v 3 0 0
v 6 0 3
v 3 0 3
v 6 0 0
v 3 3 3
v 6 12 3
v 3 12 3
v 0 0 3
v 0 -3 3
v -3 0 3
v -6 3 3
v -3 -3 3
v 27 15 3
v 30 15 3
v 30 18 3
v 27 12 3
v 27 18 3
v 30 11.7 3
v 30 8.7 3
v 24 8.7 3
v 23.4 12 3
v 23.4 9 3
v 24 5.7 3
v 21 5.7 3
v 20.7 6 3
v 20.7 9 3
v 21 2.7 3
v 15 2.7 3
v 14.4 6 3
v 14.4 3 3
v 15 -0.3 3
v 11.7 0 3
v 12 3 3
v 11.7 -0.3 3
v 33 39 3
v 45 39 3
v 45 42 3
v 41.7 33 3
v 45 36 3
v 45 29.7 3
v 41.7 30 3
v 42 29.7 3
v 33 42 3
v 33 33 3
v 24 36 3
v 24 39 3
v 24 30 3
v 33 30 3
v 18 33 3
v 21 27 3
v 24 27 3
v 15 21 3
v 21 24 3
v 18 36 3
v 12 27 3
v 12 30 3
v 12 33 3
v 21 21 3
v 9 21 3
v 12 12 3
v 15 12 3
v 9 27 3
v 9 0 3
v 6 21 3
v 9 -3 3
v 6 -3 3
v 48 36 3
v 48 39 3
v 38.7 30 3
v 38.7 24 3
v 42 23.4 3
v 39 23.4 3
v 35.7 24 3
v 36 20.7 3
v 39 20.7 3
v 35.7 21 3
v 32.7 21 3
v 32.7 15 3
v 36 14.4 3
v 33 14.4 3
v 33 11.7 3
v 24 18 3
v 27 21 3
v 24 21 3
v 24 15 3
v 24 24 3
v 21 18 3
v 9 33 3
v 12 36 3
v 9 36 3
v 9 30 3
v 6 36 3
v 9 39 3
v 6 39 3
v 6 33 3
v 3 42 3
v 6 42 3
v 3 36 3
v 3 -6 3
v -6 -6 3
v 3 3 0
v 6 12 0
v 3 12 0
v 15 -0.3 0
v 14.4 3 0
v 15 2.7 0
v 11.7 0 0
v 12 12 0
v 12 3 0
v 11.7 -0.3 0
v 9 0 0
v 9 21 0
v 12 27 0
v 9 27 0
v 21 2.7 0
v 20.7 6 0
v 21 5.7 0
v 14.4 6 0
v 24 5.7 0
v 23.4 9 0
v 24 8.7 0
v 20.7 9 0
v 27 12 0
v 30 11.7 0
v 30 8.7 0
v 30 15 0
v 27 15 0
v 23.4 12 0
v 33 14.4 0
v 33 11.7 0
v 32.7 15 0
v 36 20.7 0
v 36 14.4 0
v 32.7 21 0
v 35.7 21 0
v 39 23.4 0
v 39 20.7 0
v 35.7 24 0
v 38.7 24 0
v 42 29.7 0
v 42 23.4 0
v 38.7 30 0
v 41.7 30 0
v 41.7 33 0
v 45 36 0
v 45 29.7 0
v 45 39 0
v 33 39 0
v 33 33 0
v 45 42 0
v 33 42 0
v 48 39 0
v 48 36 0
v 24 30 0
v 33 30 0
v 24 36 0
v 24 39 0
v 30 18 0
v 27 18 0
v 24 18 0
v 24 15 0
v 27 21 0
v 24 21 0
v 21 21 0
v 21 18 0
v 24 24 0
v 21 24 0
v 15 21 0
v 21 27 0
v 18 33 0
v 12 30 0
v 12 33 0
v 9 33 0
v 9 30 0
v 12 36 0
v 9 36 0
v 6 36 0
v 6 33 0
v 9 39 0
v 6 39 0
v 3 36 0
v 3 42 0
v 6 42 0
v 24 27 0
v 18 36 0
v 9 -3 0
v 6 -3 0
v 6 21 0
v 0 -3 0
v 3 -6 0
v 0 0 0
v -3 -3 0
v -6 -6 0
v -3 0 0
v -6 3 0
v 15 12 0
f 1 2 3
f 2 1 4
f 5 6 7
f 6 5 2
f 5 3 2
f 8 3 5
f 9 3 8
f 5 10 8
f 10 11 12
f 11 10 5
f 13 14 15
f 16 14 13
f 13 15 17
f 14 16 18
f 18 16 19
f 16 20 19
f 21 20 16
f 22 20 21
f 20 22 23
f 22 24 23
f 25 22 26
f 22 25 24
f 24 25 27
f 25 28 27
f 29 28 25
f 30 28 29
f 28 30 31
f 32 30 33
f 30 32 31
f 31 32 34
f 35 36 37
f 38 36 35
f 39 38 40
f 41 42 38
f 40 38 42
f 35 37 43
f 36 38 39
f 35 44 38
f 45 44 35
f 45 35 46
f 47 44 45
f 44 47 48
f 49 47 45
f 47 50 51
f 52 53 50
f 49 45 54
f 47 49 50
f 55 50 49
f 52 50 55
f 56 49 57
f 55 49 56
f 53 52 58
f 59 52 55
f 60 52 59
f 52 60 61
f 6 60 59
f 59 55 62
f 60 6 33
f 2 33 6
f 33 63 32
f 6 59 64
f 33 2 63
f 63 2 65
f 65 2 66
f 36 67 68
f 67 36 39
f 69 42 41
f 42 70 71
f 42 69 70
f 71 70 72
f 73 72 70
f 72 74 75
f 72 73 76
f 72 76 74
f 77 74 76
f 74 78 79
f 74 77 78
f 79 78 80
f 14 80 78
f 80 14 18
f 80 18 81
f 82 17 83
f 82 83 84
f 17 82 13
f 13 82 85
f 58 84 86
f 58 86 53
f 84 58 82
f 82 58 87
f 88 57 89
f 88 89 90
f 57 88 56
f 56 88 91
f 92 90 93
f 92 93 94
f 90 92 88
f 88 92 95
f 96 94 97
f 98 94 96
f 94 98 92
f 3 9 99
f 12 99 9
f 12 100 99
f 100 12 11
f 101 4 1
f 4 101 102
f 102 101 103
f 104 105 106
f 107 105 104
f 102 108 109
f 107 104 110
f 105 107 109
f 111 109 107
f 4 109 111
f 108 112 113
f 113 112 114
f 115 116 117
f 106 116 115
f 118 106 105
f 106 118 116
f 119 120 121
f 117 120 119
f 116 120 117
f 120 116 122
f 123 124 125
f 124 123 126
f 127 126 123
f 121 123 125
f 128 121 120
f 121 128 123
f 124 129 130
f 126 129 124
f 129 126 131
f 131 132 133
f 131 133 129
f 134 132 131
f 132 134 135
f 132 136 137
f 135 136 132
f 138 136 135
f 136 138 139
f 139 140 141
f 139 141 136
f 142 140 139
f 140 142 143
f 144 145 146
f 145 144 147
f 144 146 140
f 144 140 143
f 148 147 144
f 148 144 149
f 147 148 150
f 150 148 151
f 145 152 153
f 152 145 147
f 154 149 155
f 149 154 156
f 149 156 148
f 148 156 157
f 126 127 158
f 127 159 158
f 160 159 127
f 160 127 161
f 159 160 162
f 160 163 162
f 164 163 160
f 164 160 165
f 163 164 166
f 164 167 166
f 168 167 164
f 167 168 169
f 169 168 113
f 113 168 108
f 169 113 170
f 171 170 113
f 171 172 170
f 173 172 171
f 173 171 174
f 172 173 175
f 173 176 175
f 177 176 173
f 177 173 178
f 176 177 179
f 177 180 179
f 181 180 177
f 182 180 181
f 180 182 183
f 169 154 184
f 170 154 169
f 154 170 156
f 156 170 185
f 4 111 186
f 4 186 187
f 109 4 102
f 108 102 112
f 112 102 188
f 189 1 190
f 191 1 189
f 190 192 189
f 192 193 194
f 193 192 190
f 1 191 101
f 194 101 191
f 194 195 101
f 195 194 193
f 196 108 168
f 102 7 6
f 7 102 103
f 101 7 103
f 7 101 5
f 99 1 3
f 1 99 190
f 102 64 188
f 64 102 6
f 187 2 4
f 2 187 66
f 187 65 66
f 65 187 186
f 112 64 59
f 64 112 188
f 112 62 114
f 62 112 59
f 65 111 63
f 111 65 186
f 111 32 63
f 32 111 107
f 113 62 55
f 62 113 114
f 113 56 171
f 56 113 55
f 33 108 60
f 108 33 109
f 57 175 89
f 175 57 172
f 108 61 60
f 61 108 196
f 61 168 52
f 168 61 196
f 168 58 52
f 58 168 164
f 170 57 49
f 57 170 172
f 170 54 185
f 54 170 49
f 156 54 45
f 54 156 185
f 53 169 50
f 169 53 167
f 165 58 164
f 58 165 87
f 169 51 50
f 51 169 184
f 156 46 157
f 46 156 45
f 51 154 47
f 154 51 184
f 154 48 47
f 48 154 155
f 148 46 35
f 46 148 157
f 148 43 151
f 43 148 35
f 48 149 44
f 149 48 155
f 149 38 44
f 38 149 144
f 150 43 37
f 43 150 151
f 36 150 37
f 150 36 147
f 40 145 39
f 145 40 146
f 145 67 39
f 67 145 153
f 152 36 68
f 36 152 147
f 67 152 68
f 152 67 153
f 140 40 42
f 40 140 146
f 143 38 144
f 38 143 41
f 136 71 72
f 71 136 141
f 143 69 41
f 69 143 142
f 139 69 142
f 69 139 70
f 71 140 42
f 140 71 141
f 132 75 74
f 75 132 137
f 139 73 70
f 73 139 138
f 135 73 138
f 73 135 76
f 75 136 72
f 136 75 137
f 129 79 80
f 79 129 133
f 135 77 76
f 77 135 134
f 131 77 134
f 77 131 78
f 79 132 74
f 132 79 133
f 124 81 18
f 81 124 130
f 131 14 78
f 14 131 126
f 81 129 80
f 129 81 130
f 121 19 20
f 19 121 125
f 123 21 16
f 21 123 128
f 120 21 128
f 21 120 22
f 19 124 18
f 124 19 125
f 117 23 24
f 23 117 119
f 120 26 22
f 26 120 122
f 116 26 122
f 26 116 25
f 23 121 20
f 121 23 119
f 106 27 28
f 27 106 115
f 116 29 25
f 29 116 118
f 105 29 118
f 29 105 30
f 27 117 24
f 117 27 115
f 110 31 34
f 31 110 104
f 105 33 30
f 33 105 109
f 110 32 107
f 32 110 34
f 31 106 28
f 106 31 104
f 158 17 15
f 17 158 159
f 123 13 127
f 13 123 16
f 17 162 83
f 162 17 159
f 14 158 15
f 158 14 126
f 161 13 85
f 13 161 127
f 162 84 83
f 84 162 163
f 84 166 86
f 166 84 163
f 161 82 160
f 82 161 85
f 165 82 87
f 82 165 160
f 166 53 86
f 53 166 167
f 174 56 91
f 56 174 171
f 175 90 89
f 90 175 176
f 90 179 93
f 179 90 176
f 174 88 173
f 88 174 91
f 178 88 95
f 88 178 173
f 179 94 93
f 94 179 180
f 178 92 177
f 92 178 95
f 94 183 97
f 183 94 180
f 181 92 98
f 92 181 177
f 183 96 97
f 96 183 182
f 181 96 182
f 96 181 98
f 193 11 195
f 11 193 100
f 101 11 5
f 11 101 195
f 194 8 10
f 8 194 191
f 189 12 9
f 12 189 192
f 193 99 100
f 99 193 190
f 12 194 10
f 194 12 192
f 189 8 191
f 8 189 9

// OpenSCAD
//Minecraft Tools
//Developed by Rich Pereira
//rich@pereira.com
//--------------------------
//More to come!
//--------------------------


//CUSTOMIZER VARIABLES

//	Select tool
tool = 8;	//	[1:Spade, 2:Pickaxe, 3:Axe, 4:Hoe, 5:Sword, 6:Egg, 7:Bow, 8: BowAndArrow]

//	Scale (tenths of mm per cube)
cube_size = 30;	//	[1:50]

//  Whether to add a hanger hole ath -1, -1
hanghole = 1;  // [0:No, 1: Yes]

//CUSTOMIZER VARIABLES END

scale([cube_size/10,cube_size/10,cube_size/10]) {
    if (tool==1) spade();
    if (tool==2) pick();
    if (tool==3) axe();
    if (tool==4) hoe();
    if (tool==5) sword();
    if (tool==6) egg();
    if (tool==7) bow();
    if (tool==8) bow_and_arrow();
        
    if (hanghole == 1) {
        translate([-2,0,0]) cube([3,1,1]);
        translate([-2,-2,0]) cube([3,1,1]);
        translate([-2,-1,0]) cube([1,1,1]);
        translate([0,-1,0]) cube([1,1,1]);
    }
}



module bow_and_arrow() {
    // move the model so the hanger hole is in a good place
    translate([16,14,0]) mirror([1,1,0]) {
    // body
    translate([10,14,0]) cube([4,1,1]);
    translate([7,13,0]) cube([8,1,1]);
    translate([5,12,0]) cube([9,1,1]);
    translate([4,11,0]) cube([6,1,1]);
    translate([3,10,0]) cube([4,1,1]);
    translate([2,9,0]) cube([3,1,1]);
    translate([2,8,0]) cube([3,1,1]);
    translate([1,7,0]) cube([3,1,1]);
    translate([1,6,0]) cube([3,1,1]);
    translate([1,5,0]) cube([3,1,1]);
    translate([0,4,0]) cube([3,1,1]);
    translate([0,3,0]) cube([3,1,1]);
    translate([0,2,0]) cube([3,1,1]);
    translate([0,1,0]) cube([3,1,1]);
    translate([1,0,0]) cube([1,1,1]);
    // string
    stringcube=1.1;
    translate([3,1,0]) cube([stringcube,stringcube,1]);
    translate([4,2,0]) cube([2*stringcube,stringcube,1]);
    translate([6,3,0]) cube([stringcube,stringcube,1]);
    translate([7,4,0]) cube([2*stringcube,stringcube,1]);
    translate([9,5,0]) cube([stringcube,stringcube,1]);
    translate([10,6,0]) cube([stringcube,2*stringcube,1]);
    translate([11,8,0]) cube([stringcube,stringcube,1]);
    translate([12,9,0]) cube([stringcube,2*stringcube,1]);
    translate([13,11,0]) cube([stringcube,stringcube,1]);
    
    // arrow
    translate([8,6,0]) cube([2,1,1]);
    translate([7,7,0]) cube([2,1,1]);
    translate([6,8,0]) cube([2,1,1]);
    translate([5,9,0]) cube([2,1,1]);
    translate([4,10,0]) cube([2,1,1]);
    translate([3,11,0]) cube([2,1,1]);
    translate([2,12,0]) cube([2,1,1]);
    translate([1,13,0]) cube([2,1,1]);
    translate([0,14,0]) cube([2,1,1]);
}
};

module bow() {
    // body
    translate([10,14,0]) cube([4,1,1]);
    translate([7,13,0]) cube([8,1,1]);
    translate([5,12,0]) cube([9,1,1]);
    translate([4,11,0]) cube([6,1,1]);
    translate([3,10,0]) cube([4,1,1]);
    translate([2,9,0]) cube([3,1,1]);
    translate([2,8,0]) cube([3,1,1]);
    translate([1,7,0]) cube([3,1,1]);
    translate([1,6,0]) cube([3,1,1]);
    translate([1,5,0]) cube([3,1,1]);
    translate([0,4,0]) cube([3,1,1]);
    translate([0,3,0]) cube([3,1,1]);
    translate([0,2,0]) cube([3,1,1]);
    translate([0,1,0]) cube([3,1,1]);
    translate([1,0,0]) cube([1,1,1]);
    // string
    stringcube=1.05;
    translate([3,2,0]) cube([stringcube,stringcube,1]);
    translate([4,3,0]) cube([stringcube,stringcube,1]);
    translate([5,4,0]) cube([stringcube,stringcube,1]);
    translate([6,5,0]) cube([stringcube,stringcube,1]);
    translate([7,6,0]) cube([stringcube,stringcube,1]);
    translate([8,7,0]) cube([stringcube,stringcube,1]);
    translate([9,8,0]) cube([stringcube,stringcube,1]);
    translate([10,9,0]) cube([stringcube,stringcube,1]);
    translate([11,10,0]) cube([stringcube,stringcube,1]);
    translate([12,11,0]) cube([stringcube,stringcube,1]);
};

module spade() {
    translate([9,12,0]) cube([3,1,1]);
    translate([8,11,0]) cube([5,1,1]);
    translate([7,10,0]) cube([6,1,1]);
    translate([6,9,0]) cube([7,1,1]);
    translate([7,8,0]) cube([5,1,1]);
    translate([6,7,0]) cube([5,1,1]);
    translate([5,6,0]) cube([3,1,1]);
    translate([4,5,0]) cube([3,1,1]);
    translate([3,4,0]) cube([3,1,1]);
    translate([2,3,0]) cube([3,1,1]);
    translate([0,2,0]) cube([4,1,1]);
    translate([0,1,0]) cube([3,1,1]);
    translate([1,0,0]) cube([2,1,1]);
    translate([9,6,0]) cube([1,1,1]);
};

module pick() {
    translate([4,12,0]) cube([5,1,1]);
    translate([3,11,0]) cube([9,1,1]);
    translate([4,10,0]) cube([8,1,1]);
    translate([8,9,0]) cube([4,1,1]);
    translate([7,8,0]) cube([6,1,1]);
    translate([6,7,0]) cube([3,1,1]);
    translate([5,6,0]) cube([3,1,1]);
    translate([4,5,0]) cube([3,1,1]);
    translate([3,4,0]) cube([3,1,1]);
    translate([2,3,0]) cube([3,1,1]);
    translate([1,2,0]) cube([3,1,1]);
    translate([0,1,0]) cube([3,1,1]);
    translate([0,0,0]) cube([2,1,1]);
    translate([10,7,0]) cube([3,1,1]);
    translate([10,6,0]) cube([3,1,1]);
    translate([10,5,0]) cube([3,1,1]);
    translate([10,4,0]) cube([3,1,1]);
    translate([11,3,0]) cube([1,1,1]);
};

module axe() {
    translate([8,14,0]) cube([2,1,1]);
    translate([7,13,0]) cube([4,1,1]);
    translate([6,12,0]) cube([5,1,1]);
    translate([5,11,0]) cube([7,1,1]);
    translate([5,10,0]) cube([7,1,1]);
    translate([6,9,0]) cube([7,1,1]);
    translate([7,8,0]) cube([6,1,1]);
    translate([6,7,0]) cube([3,1,1]);
    translate([5,6,0]) cube([3,1,1]);
    translate([4,5,0]) cube([3,1,1]);
    translate([3,4,0]) cube([3,1,1]);
    translate([2,3,0]) cube([3,1,1]);
    translate([1,2,0]) cube([3,1,1]);
    translate([0,1,0]) cube([3,1,1]);
    translate([0,0,0]) cube([2,1,1]);
    translate([10,7,0]) cube([2,1,1]);
};

module hoe() {
    translate([5,13,0]) cube([3,1,1]);
    translate([4,12,0]) cube([5,1,1]);
    translate([5,11,0]) cube([7,1,1]);
    translate([7,10,0]) cube([5,1,1]);
    translate([8,9,0]) cube([4,1,1]);
    translate([7,8,0]) cube([4,1,1]);
    translate([6,7,0]) cube([3,1,1]);
    translate([5,6,0]) cube([3,1,1]);
    translate([4,5,0]) cube([3,1,1]);
    translate([3,4,0]) cube([3,1,1]);
    translate([2,3,0]) cube([3,1,1]);
    translate([1,2,0]) cube([3,1,1]);
    translate([0,1,0]) cube([3,1,1]);
    translate([0,0,0]) cube([2,1,1]);
};

module egg() {
    translate([4,12,0]) cube([4,1,1]);
    translate([3,11,0]) cube([6,1,1]);
    translate([2,10,0]) cube([8,1,1]);
    translate([1,9,0]) cube([9,1,1]);
    translate([1,8,0]) cube([10,1,1]);
    translate([0,7,0]) cube([11,1,1]);
    translate([0,6,0]) cube([12,1,1]);
    translate([0,5,0]) cube([12,1,1]);
    translate([0,4,0]) cube([12,1,1]);
    translate([1,3,0]) cube([10,1,1]);
    translate([1,2,0]) cube([10,1,1]);
    translate([2,1,0]) cube([8,1,1]);
    translate([3,0,0]) cube([6,1,1]);
};

module sword() {
    translate([13,15,0]) cube ([3,1,1]);
    translate([12,14,0]) cube ([4,1,1]);
    translate([11,13,0]) cube ([5,1,1]);
    translate([10,12,0]) cube ([5,1,1]);
    translate([9,11,0]) cube ([5,1,1]);
    translate([8,10,0]) cube ([5,1,1]);
    translate([2,9,0]) cube ([2,1,1]);
    translate([2,8,0]) cube ([3,1,1]);
    translate([3,7,0]) cube ([7,1,1]);
    translate([3,6,0]) cube ([6,1,1]);
    translate([4,5,0]) cube ([4,1,1]);
    translate([3,4,0]) cube ([6,1,1]);
    translate([2,3,0]) cube ([3,1,1]);
    translate([0,2,0]) cube ([4,1,1]);
    translate([0,1,0]) cube ([3,1,1]);
    translate([0,0,0]) cube ([3,1,1]);
    translate([7,9,0]) cube ([5,1,1]);
    translate([6,8,0]) cube ([5,1,1]);
    translate([6,3,0]) cube ([4,1,1]);
    translate([8,2,0]) cube ([2,1,1]);
};

